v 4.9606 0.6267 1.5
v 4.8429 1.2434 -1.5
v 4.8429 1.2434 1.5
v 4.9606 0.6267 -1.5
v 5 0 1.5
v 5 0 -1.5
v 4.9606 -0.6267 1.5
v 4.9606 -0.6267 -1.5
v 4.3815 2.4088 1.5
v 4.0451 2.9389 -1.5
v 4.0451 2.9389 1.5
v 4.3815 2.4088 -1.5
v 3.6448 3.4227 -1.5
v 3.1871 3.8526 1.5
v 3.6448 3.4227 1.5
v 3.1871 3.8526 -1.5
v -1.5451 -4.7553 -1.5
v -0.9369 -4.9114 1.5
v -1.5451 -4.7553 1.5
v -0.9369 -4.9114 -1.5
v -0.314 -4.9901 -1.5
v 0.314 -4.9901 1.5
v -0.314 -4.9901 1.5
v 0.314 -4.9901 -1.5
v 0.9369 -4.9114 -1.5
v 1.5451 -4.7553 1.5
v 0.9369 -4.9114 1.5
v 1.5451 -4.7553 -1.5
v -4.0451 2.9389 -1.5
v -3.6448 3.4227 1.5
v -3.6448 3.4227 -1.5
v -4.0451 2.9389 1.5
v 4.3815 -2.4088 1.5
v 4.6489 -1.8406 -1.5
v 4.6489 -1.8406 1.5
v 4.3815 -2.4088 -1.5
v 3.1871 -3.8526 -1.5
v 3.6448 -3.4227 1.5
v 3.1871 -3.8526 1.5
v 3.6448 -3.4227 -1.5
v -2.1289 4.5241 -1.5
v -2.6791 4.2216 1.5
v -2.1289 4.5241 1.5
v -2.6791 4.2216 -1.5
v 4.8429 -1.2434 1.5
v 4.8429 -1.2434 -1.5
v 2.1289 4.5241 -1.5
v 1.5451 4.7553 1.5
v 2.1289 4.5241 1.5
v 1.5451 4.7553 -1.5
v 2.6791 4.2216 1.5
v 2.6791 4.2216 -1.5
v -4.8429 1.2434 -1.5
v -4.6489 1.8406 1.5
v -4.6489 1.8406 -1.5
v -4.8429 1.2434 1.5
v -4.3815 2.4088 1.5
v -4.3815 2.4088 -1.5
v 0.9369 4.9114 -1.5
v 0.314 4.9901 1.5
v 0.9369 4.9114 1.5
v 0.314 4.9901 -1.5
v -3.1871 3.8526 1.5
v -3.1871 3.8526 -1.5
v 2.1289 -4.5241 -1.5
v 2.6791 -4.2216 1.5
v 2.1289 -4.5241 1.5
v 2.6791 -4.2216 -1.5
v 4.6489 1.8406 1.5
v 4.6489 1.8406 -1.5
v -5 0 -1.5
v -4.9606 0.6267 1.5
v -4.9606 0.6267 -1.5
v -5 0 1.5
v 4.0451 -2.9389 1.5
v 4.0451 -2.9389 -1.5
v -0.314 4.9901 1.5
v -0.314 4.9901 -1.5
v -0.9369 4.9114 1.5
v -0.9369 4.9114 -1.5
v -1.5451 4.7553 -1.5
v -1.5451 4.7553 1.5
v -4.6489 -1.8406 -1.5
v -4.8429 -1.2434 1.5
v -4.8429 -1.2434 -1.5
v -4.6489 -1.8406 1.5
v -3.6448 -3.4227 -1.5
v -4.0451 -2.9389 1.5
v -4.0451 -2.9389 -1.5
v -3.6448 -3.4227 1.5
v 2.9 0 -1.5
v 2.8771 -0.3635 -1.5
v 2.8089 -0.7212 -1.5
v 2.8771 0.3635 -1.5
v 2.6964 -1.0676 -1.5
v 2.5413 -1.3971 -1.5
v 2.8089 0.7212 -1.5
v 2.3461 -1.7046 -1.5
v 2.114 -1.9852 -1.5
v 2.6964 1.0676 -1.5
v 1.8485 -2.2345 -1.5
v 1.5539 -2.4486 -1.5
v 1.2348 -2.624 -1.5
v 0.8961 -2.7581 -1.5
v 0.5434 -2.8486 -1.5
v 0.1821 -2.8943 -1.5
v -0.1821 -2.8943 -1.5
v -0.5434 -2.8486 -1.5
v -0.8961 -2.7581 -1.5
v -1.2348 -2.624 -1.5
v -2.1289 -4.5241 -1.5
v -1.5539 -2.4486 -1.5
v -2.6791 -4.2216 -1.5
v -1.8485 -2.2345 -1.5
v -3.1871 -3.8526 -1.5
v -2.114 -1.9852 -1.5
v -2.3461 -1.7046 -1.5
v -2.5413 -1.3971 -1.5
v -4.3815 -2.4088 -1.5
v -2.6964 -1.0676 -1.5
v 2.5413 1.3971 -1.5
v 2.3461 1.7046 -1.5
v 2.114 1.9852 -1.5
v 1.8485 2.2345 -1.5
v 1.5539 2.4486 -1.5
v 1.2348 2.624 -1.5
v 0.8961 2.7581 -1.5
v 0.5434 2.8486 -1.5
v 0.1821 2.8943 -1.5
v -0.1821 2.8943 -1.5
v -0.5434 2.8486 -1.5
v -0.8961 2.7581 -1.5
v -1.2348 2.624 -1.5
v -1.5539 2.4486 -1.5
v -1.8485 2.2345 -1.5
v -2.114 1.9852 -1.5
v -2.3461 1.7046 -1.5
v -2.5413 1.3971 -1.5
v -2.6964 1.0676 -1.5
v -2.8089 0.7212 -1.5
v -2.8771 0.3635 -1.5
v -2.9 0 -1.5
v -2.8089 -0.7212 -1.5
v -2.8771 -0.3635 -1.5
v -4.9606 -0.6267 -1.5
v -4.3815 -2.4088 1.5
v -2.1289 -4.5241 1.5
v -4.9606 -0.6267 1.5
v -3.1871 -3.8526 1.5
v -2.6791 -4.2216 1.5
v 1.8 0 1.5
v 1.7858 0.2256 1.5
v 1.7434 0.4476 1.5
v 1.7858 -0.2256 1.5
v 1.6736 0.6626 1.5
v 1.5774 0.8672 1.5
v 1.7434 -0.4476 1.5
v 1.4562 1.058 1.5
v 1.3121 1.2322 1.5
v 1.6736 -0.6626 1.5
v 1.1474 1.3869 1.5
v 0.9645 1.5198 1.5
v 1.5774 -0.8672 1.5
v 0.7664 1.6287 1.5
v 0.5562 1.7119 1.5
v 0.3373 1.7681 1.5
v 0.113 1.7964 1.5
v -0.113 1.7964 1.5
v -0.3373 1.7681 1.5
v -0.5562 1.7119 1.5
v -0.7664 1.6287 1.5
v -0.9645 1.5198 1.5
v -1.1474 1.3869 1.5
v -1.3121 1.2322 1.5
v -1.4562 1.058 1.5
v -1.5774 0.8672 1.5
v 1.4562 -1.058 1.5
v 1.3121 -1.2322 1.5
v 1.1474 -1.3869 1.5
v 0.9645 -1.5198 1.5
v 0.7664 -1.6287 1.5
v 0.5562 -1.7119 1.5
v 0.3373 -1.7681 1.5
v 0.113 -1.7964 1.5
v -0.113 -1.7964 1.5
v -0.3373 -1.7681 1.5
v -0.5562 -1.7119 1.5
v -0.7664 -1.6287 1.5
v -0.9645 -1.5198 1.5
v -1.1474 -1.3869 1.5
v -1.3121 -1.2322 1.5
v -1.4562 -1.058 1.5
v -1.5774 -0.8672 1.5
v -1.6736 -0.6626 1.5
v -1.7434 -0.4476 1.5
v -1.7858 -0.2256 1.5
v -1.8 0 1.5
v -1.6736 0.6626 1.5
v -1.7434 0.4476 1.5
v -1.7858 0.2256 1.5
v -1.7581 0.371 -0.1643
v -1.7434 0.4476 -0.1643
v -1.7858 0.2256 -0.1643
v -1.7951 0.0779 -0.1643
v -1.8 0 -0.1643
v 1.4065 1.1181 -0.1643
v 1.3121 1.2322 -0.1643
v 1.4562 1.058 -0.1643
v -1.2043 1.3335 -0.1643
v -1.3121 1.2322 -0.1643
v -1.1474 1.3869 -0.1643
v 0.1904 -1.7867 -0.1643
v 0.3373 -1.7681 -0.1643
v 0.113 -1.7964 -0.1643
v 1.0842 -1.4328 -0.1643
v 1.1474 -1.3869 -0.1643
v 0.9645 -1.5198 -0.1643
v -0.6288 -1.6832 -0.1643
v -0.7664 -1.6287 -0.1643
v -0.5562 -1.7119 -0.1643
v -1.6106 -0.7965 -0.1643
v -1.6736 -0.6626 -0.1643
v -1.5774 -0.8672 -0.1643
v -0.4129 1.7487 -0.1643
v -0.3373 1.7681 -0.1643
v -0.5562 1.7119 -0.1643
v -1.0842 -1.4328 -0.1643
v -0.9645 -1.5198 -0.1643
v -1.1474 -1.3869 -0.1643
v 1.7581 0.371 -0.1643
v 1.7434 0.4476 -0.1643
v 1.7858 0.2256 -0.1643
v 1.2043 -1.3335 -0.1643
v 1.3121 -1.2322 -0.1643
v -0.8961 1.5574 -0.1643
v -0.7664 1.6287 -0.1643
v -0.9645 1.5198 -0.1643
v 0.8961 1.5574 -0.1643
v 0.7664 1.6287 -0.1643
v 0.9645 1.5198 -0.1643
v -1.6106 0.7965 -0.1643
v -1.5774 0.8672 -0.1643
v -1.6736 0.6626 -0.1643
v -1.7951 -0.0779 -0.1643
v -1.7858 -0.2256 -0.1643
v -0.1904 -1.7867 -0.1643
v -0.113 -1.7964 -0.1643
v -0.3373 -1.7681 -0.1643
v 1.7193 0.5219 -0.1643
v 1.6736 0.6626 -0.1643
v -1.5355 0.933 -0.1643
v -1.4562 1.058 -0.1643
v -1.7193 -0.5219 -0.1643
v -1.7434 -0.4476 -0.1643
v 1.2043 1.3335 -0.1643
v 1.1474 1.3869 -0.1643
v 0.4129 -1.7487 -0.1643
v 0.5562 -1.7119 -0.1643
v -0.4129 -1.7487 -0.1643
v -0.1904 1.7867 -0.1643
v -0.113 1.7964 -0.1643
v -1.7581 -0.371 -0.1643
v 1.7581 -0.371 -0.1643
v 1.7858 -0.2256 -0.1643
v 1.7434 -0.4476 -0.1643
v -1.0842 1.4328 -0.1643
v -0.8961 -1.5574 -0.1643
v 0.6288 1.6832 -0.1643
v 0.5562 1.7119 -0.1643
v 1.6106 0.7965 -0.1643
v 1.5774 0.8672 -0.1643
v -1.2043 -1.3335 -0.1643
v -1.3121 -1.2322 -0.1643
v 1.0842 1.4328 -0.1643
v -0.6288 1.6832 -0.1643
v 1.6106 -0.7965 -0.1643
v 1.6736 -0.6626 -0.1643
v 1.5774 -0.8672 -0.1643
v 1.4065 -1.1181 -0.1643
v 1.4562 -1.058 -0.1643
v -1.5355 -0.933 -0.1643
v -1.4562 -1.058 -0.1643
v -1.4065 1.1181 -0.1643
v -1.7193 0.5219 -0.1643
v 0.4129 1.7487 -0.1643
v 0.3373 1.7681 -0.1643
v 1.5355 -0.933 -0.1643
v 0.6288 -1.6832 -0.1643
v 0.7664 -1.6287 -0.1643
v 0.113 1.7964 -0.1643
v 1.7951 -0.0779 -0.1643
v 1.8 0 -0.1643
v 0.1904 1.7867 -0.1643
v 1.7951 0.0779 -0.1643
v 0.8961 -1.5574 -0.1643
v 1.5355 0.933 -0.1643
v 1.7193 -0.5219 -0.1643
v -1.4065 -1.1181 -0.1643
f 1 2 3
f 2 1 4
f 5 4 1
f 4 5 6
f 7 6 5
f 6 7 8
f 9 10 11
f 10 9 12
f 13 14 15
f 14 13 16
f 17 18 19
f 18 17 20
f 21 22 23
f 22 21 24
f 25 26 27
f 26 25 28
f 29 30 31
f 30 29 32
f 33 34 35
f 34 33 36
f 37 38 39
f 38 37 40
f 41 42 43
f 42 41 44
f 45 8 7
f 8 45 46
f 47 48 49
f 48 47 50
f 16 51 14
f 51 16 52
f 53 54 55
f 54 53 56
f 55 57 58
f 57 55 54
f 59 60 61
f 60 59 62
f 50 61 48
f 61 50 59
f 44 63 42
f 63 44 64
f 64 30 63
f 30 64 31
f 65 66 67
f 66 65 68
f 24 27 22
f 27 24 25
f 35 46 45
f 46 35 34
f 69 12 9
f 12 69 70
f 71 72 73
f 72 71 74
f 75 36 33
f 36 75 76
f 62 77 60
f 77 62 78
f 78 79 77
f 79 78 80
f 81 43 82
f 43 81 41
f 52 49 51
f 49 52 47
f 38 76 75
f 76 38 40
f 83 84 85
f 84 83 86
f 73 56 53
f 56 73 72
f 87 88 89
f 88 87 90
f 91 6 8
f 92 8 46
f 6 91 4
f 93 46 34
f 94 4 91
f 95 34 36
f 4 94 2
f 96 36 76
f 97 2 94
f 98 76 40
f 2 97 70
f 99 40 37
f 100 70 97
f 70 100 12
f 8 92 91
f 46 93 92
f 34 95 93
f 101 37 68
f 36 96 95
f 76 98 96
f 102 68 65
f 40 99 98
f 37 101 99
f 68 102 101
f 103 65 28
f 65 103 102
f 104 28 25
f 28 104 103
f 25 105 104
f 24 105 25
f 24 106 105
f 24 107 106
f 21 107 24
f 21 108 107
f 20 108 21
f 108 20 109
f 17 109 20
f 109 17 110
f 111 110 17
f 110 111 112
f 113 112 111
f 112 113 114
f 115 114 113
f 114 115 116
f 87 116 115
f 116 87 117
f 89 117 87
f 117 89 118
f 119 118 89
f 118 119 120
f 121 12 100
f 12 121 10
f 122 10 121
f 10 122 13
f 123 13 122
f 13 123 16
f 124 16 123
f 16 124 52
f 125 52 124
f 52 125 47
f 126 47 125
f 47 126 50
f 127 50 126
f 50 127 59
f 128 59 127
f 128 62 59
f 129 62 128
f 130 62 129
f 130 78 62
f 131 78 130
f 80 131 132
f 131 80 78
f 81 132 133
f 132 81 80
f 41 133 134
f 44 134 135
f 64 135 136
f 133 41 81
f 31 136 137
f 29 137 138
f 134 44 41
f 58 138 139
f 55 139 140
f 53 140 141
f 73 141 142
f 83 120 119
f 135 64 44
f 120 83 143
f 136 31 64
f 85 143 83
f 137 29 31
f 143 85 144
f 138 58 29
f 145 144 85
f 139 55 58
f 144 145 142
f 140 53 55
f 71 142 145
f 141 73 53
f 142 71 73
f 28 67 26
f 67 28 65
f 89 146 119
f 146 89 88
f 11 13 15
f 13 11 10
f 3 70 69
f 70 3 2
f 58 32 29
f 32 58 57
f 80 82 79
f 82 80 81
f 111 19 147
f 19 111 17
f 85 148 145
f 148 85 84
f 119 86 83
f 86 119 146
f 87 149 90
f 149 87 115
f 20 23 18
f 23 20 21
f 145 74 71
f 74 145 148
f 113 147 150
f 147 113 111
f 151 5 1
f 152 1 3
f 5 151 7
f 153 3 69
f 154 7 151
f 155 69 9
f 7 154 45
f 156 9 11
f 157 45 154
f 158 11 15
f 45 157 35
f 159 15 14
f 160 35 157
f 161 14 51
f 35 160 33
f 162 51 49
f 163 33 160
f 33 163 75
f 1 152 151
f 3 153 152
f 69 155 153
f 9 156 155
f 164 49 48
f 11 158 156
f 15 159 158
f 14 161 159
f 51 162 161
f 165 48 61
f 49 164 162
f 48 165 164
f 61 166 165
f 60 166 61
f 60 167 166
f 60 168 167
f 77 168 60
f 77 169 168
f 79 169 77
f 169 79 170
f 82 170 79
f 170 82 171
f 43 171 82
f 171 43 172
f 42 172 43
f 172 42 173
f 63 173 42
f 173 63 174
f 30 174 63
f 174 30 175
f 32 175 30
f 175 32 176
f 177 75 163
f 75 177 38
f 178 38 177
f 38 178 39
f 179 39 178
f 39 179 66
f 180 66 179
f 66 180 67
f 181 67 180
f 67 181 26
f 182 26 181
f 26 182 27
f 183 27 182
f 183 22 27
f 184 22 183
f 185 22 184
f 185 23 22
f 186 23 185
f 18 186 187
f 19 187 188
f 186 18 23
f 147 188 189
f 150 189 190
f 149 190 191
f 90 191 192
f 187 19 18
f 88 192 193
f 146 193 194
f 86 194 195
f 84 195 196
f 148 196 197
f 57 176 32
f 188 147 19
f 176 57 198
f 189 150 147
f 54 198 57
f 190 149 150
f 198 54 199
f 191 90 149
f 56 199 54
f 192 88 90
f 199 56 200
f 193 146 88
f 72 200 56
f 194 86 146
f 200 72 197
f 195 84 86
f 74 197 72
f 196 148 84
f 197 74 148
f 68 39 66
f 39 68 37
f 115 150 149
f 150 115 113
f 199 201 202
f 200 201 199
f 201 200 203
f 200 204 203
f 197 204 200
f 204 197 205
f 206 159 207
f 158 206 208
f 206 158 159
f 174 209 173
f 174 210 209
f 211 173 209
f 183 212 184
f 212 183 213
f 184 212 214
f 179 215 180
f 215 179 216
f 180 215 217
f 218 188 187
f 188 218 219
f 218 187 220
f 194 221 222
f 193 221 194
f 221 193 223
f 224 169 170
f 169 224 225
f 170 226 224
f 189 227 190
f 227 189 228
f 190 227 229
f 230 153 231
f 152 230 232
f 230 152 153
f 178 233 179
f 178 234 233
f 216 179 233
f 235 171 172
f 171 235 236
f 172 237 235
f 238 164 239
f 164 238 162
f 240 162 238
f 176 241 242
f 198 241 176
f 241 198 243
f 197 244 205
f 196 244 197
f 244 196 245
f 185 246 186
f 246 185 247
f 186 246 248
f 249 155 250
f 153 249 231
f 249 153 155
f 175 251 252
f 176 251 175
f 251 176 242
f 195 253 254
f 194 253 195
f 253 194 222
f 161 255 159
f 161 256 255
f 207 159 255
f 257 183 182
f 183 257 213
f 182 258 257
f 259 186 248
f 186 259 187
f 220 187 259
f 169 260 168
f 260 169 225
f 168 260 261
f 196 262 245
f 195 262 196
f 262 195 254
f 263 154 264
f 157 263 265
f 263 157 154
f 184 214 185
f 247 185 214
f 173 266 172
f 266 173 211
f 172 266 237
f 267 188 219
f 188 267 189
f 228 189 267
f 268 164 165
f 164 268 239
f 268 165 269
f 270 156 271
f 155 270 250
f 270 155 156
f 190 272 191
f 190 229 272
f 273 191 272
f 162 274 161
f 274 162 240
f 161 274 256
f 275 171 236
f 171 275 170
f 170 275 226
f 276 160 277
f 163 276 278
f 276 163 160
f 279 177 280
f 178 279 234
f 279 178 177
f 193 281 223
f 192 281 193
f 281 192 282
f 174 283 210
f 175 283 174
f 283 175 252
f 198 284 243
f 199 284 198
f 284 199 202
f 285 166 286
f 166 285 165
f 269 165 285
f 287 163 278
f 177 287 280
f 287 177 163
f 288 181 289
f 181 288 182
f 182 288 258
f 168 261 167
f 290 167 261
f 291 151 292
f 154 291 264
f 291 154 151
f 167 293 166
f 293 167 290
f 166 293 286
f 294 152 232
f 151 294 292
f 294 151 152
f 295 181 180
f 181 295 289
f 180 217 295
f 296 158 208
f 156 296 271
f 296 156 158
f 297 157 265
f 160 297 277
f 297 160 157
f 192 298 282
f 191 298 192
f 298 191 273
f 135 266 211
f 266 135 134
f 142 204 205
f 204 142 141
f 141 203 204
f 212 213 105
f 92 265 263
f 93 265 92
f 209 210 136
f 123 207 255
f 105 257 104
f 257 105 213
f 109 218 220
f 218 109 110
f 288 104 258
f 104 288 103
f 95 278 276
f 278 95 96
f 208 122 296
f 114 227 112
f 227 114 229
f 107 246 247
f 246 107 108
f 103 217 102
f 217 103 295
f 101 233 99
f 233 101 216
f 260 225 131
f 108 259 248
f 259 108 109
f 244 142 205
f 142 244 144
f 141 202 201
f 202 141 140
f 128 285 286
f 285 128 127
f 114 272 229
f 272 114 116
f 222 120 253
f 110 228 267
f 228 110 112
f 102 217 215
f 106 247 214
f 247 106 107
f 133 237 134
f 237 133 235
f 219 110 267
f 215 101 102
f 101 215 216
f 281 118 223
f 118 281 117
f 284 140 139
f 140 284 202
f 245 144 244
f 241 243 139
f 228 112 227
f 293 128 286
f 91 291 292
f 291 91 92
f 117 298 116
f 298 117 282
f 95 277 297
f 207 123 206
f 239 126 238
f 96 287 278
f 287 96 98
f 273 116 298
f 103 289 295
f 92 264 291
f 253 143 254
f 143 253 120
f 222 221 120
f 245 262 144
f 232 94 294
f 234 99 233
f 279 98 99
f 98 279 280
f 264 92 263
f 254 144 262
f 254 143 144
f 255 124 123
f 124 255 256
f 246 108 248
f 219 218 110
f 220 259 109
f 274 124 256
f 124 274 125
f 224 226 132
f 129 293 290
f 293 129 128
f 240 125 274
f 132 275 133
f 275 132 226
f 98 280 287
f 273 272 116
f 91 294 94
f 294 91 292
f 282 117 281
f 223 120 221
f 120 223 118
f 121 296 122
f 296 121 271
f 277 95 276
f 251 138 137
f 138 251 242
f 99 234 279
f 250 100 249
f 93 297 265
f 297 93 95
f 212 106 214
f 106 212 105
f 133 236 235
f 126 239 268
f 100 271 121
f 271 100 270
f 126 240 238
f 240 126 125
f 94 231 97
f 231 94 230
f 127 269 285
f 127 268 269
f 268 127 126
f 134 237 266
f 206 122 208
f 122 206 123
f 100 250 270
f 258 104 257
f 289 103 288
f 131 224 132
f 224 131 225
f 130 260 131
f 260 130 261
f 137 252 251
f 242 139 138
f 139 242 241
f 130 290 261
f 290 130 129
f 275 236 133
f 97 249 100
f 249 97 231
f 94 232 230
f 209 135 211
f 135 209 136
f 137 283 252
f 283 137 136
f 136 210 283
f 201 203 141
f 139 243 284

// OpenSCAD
$fn = 50;


difference() {
	union() {
		translate(v = [0, 0, -1.5000000000]) {
			cylinder(h = 3, r = 5.0000000000);
		}
		translate(v = [0, 0, -1.5000000000]) {
			cylinder(h = 3, r = 3.0000000000);
		}
	}
	union() {
		translate(v = [0, 0, -1.5000000000]) {
			rotate(a = [0, 180, 0]) {
				difference() {
					union() {
						translate(v = [0, 0, -3.0000000000]) {
							cylinder(h = 3, r = 1.5000000000);
						}
						translate(v = [0, 0, -3.0000000000]) {
							cylinder(h = 3, r = 1.8000000000);
						}
						translate(v = [0, 0, -1.7000000000]) {
							cylinder(h = 1.7000000000, r1 = 1.5000000000, r2 = 2.9000000000);
						}
						translate(v = [0, 0, -3.0000000000]) {
							cylinder(h = 3, r = 1.5000000000);
						}
					}
					union();
				}
			}
		}
		translate(v = [0, 0, -100.0000000000]) {
			cylinder(h = 200, r = 1.5000000000);
		}
	}
}
